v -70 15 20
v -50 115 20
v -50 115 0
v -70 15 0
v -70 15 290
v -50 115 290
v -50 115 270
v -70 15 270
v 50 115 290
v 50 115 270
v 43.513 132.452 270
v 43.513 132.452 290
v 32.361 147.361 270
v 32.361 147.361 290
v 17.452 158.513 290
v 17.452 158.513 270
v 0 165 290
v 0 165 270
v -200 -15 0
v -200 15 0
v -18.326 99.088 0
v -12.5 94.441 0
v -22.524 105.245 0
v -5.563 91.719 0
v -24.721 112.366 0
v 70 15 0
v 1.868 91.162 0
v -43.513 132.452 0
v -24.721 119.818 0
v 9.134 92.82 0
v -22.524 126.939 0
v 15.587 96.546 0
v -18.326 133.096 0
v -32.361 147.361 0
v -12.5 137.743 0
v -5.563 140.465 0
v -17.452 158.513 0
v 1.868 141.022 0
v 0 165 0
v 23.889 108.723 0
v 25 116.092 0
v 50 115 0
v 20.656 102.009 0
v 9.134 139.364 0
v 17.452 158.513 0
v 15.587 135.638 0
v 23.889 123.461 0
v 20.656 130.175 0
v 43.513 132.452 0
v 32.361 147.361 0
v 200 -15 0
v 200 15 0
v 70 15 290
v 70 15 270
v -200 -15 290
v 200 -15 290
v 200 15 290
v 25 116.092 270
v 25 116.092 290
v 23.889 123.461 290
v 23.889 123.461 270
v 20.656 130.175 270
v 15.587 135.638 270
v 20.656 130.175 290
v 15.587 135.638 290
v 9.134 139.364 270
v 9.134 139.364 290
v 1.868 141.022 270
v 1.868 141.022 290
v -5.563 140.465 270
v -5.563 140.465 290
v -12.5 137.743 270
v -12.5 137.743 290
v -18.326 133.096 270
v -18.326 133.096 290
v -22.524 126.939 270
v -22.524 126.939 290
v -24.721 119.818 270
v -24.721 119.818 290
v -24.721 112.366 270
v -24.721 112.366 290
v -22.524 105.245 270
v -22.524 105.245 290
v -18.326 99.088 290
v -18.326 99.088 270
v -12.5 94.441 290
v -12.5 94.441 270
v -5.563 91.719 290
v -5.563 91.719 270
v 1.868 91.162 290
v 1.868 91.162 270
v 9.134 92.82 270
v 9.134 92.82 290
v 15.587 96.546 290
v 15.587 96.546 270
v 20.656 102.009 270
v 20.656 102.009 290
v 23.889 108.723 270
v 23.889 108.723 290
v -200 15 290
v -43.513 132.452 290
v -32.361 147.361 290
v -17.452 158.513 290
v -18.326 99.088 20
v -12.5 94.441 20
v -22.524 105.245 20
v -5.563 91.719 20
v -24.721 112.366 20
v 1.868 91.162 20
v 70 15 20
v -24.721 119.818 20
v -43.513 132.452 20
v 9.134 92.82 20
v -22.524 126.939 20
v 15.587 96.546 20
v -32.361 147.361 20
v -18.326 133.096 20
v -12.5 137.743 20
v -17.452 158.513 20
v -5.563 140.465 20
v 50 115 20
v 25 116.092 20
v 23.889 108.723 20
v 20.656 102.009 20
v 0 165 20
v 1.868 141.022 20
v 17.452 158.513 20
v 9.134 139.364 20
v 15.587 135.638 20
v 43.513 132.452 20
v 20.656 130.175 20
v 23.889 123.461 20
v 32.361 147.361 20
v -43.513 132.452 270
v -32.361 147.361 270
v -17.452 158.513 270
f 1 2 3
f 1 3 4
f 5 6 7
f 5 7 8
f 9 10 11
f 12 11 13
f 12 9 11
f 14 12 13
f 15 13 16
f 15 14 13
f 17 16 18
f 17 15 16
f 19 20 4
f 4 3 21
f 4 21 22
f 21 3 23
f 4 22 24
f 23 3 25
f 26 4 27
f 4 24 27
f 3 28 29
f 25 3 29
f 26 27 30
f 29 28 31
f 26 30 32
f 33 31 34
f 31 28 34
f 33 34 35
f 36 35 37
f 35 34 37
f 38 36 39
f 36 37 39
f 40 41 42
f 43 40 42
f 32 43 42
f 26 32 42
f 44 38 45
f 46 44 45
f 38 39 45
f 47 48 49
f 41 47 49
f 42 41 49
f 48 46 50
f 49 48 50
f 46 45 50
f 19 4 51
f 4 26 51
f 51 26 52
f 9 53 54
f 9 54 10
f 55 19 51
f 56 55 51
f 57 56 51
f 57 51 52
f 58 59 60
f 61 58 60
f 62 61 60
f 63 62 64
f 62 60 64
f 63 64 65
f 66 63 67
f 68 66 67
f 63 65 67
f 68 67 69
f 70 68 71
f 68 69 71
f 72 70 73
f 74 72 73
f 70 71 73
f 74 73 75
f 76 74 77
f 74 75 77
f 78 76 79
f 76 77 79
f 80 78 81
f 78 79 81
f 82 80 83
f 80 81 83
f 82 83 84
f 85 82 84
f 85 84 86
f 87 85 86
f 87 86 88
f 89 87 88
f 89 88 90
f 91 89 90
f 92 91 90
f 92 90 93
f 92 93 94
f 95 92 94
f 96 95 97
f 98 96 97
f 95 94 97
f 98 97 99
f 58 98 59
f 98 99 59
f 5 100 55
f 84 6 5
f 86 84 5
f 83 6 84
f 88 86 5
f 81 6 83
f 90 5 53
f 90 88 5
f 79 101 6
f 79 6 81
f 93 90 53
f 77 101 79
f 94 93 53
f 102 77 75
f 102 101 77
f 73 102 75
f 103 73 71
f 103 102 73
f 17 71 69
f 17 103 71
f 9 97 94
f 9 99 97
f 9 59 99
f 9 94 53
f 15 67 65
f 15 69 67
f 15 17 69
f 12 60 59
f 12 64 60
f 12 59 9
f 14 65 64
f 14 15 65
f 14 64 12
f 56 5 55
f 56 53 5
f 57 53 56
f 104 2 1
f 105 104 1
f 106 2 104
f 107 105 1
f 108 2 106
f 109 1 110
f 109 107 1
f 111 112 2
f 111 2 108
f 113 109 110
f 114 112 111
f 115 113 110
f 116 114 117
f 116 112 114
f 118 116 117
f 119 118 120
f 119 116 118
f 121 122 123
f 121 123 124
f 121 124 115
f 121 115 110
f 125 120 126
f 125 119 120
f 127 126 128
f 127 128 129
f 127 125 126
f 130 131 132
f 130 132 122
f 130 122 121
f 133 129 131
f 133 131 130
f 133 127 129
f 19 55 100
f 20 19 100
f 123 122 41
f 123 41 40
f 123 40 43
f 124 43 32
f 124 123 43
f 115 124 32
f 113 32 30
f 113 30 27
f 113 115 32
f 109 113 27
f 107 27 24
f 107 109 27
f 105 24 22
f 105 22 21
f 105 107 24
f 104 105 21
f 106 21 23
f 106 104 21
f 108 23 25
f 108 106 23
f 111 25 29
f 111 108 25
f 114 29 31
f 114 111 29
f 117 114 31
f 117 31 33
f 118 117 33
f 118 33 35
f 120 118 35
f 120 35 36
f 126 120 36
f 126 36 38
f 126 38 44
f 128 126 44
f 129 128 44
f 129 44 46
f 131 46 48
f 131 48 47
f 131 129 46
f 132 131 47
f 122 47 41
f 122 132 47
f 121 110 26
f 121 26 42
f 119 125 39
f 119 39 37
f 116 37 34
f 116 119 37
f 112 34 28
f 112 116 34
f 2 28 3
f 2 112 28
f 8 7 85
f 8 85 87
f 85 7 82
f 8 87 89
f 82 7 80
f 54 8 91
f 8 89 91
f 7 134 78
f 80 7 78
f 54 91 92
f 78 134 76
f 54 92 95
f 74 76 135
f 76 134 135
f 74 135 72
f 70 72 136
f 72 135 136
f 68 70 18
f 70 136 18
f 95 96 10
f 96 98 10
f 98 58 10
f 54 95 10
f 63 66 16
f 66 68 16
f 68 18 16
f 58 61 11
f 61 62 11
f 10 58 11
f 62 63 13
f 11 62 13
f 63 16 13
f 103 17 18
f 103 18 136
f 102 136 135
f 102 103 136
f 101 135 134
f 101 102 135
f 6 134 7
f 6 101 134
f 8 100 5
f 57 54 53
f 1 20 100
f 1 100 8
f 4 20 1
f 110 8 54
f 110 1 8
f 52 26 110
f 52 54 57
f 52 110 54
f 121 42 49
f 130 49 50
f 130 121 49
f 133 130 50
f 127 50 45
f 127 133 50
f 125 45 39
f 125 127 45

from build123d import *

# Parameters (mm, degrees)
SKETCH1_W           = 400
SKETCH1_H           = 30
BOSS_EXTRUDE1_DEPTH = 290
BOSS_EXTRUDE2_DEPTH = 20
SKETCH4_R           = 25
CUT_EXTRUDE1_DEPTH  = 20
BOSS_EXTRUDE3_START = -20
SKETCH5_R           = 25
BOSS_EXTRUDE3_DEPTH = 20


with BuildPart() as part:
    # Sketch1 → Boss-Extrude1 (new body)
    with BuildSketch(Plane.XY):
        Rectangle(SKETCH1_W, SKETCH1_H)
    extrude(amount=BOSS_EXTRUDE1_DEPTH)

    # Sketch2 → Boss-Extrude2 (add)
    with BuildSketch(Plane.XY.offset(290)):
        with BuildLine():
            Line((0, 165), (0, 115))
            Line((0, 115), (50, 115))
            ThreePointArc((50, 115), (32.360636061, 147.360636061), (0, 165))
        make_face()
        with BuildLine():
            Line((-50, 115), (0, 115))
            Line((0, 115), (0, 165))
            ThreePointArc((0, 165), (-32.360636061, 147.360636061), (-50, 115))
        make_face()
        Polygon((-70, 15), (0, 15), (0, 115), (-50, 115), align=None)
        Polygon((0, 115), (0, 15), (70, 15), (50, 115), align=None)
    extrude(amount=-BOSS_EXTRUDE2_DEPTH)

    # Sketch4 → Cut-Extrude1 (cut)
    with BuildSketch(Plane.XY.offset(290)):
        with Locations((0, 116.092070287)):
            Circle(SKETCH4_R)
    extrude(amount=-CUT_EXTRUDE1_DEPTH, mode=Mode.SUBTRACT)

    # Sketch5 → Boss-Extrude3 (add)
    with BuildSketch(Plane(origin=(0, 0, 0), x_dir=(-1, 0, 0), z_dir=(0, 0, -1)).offset(BOSS_EXTRUDE3_START)):
        with BuildLine():
            Line((-70, 15), (-50, 115))
            ThreePointArc((-50, 115), (-32.360636061, 147.360636061), (0, 165))
            ThreePointArc((0, 165), (32.360636061, 147.360636061), (50, 115))
            Line((50, 115), (70, 15))
            Line((70, 15), (-70, 15))
        make_face()
        with Locations(Location((0, 116.092070287, 0), (0, 0, 180))):
            Circle(SKETCH5_R, mode=Mode.SUBTRACT)
    extrude(amount=BOSS_EXTRUDE3_DEPTH)


solid = part.part
